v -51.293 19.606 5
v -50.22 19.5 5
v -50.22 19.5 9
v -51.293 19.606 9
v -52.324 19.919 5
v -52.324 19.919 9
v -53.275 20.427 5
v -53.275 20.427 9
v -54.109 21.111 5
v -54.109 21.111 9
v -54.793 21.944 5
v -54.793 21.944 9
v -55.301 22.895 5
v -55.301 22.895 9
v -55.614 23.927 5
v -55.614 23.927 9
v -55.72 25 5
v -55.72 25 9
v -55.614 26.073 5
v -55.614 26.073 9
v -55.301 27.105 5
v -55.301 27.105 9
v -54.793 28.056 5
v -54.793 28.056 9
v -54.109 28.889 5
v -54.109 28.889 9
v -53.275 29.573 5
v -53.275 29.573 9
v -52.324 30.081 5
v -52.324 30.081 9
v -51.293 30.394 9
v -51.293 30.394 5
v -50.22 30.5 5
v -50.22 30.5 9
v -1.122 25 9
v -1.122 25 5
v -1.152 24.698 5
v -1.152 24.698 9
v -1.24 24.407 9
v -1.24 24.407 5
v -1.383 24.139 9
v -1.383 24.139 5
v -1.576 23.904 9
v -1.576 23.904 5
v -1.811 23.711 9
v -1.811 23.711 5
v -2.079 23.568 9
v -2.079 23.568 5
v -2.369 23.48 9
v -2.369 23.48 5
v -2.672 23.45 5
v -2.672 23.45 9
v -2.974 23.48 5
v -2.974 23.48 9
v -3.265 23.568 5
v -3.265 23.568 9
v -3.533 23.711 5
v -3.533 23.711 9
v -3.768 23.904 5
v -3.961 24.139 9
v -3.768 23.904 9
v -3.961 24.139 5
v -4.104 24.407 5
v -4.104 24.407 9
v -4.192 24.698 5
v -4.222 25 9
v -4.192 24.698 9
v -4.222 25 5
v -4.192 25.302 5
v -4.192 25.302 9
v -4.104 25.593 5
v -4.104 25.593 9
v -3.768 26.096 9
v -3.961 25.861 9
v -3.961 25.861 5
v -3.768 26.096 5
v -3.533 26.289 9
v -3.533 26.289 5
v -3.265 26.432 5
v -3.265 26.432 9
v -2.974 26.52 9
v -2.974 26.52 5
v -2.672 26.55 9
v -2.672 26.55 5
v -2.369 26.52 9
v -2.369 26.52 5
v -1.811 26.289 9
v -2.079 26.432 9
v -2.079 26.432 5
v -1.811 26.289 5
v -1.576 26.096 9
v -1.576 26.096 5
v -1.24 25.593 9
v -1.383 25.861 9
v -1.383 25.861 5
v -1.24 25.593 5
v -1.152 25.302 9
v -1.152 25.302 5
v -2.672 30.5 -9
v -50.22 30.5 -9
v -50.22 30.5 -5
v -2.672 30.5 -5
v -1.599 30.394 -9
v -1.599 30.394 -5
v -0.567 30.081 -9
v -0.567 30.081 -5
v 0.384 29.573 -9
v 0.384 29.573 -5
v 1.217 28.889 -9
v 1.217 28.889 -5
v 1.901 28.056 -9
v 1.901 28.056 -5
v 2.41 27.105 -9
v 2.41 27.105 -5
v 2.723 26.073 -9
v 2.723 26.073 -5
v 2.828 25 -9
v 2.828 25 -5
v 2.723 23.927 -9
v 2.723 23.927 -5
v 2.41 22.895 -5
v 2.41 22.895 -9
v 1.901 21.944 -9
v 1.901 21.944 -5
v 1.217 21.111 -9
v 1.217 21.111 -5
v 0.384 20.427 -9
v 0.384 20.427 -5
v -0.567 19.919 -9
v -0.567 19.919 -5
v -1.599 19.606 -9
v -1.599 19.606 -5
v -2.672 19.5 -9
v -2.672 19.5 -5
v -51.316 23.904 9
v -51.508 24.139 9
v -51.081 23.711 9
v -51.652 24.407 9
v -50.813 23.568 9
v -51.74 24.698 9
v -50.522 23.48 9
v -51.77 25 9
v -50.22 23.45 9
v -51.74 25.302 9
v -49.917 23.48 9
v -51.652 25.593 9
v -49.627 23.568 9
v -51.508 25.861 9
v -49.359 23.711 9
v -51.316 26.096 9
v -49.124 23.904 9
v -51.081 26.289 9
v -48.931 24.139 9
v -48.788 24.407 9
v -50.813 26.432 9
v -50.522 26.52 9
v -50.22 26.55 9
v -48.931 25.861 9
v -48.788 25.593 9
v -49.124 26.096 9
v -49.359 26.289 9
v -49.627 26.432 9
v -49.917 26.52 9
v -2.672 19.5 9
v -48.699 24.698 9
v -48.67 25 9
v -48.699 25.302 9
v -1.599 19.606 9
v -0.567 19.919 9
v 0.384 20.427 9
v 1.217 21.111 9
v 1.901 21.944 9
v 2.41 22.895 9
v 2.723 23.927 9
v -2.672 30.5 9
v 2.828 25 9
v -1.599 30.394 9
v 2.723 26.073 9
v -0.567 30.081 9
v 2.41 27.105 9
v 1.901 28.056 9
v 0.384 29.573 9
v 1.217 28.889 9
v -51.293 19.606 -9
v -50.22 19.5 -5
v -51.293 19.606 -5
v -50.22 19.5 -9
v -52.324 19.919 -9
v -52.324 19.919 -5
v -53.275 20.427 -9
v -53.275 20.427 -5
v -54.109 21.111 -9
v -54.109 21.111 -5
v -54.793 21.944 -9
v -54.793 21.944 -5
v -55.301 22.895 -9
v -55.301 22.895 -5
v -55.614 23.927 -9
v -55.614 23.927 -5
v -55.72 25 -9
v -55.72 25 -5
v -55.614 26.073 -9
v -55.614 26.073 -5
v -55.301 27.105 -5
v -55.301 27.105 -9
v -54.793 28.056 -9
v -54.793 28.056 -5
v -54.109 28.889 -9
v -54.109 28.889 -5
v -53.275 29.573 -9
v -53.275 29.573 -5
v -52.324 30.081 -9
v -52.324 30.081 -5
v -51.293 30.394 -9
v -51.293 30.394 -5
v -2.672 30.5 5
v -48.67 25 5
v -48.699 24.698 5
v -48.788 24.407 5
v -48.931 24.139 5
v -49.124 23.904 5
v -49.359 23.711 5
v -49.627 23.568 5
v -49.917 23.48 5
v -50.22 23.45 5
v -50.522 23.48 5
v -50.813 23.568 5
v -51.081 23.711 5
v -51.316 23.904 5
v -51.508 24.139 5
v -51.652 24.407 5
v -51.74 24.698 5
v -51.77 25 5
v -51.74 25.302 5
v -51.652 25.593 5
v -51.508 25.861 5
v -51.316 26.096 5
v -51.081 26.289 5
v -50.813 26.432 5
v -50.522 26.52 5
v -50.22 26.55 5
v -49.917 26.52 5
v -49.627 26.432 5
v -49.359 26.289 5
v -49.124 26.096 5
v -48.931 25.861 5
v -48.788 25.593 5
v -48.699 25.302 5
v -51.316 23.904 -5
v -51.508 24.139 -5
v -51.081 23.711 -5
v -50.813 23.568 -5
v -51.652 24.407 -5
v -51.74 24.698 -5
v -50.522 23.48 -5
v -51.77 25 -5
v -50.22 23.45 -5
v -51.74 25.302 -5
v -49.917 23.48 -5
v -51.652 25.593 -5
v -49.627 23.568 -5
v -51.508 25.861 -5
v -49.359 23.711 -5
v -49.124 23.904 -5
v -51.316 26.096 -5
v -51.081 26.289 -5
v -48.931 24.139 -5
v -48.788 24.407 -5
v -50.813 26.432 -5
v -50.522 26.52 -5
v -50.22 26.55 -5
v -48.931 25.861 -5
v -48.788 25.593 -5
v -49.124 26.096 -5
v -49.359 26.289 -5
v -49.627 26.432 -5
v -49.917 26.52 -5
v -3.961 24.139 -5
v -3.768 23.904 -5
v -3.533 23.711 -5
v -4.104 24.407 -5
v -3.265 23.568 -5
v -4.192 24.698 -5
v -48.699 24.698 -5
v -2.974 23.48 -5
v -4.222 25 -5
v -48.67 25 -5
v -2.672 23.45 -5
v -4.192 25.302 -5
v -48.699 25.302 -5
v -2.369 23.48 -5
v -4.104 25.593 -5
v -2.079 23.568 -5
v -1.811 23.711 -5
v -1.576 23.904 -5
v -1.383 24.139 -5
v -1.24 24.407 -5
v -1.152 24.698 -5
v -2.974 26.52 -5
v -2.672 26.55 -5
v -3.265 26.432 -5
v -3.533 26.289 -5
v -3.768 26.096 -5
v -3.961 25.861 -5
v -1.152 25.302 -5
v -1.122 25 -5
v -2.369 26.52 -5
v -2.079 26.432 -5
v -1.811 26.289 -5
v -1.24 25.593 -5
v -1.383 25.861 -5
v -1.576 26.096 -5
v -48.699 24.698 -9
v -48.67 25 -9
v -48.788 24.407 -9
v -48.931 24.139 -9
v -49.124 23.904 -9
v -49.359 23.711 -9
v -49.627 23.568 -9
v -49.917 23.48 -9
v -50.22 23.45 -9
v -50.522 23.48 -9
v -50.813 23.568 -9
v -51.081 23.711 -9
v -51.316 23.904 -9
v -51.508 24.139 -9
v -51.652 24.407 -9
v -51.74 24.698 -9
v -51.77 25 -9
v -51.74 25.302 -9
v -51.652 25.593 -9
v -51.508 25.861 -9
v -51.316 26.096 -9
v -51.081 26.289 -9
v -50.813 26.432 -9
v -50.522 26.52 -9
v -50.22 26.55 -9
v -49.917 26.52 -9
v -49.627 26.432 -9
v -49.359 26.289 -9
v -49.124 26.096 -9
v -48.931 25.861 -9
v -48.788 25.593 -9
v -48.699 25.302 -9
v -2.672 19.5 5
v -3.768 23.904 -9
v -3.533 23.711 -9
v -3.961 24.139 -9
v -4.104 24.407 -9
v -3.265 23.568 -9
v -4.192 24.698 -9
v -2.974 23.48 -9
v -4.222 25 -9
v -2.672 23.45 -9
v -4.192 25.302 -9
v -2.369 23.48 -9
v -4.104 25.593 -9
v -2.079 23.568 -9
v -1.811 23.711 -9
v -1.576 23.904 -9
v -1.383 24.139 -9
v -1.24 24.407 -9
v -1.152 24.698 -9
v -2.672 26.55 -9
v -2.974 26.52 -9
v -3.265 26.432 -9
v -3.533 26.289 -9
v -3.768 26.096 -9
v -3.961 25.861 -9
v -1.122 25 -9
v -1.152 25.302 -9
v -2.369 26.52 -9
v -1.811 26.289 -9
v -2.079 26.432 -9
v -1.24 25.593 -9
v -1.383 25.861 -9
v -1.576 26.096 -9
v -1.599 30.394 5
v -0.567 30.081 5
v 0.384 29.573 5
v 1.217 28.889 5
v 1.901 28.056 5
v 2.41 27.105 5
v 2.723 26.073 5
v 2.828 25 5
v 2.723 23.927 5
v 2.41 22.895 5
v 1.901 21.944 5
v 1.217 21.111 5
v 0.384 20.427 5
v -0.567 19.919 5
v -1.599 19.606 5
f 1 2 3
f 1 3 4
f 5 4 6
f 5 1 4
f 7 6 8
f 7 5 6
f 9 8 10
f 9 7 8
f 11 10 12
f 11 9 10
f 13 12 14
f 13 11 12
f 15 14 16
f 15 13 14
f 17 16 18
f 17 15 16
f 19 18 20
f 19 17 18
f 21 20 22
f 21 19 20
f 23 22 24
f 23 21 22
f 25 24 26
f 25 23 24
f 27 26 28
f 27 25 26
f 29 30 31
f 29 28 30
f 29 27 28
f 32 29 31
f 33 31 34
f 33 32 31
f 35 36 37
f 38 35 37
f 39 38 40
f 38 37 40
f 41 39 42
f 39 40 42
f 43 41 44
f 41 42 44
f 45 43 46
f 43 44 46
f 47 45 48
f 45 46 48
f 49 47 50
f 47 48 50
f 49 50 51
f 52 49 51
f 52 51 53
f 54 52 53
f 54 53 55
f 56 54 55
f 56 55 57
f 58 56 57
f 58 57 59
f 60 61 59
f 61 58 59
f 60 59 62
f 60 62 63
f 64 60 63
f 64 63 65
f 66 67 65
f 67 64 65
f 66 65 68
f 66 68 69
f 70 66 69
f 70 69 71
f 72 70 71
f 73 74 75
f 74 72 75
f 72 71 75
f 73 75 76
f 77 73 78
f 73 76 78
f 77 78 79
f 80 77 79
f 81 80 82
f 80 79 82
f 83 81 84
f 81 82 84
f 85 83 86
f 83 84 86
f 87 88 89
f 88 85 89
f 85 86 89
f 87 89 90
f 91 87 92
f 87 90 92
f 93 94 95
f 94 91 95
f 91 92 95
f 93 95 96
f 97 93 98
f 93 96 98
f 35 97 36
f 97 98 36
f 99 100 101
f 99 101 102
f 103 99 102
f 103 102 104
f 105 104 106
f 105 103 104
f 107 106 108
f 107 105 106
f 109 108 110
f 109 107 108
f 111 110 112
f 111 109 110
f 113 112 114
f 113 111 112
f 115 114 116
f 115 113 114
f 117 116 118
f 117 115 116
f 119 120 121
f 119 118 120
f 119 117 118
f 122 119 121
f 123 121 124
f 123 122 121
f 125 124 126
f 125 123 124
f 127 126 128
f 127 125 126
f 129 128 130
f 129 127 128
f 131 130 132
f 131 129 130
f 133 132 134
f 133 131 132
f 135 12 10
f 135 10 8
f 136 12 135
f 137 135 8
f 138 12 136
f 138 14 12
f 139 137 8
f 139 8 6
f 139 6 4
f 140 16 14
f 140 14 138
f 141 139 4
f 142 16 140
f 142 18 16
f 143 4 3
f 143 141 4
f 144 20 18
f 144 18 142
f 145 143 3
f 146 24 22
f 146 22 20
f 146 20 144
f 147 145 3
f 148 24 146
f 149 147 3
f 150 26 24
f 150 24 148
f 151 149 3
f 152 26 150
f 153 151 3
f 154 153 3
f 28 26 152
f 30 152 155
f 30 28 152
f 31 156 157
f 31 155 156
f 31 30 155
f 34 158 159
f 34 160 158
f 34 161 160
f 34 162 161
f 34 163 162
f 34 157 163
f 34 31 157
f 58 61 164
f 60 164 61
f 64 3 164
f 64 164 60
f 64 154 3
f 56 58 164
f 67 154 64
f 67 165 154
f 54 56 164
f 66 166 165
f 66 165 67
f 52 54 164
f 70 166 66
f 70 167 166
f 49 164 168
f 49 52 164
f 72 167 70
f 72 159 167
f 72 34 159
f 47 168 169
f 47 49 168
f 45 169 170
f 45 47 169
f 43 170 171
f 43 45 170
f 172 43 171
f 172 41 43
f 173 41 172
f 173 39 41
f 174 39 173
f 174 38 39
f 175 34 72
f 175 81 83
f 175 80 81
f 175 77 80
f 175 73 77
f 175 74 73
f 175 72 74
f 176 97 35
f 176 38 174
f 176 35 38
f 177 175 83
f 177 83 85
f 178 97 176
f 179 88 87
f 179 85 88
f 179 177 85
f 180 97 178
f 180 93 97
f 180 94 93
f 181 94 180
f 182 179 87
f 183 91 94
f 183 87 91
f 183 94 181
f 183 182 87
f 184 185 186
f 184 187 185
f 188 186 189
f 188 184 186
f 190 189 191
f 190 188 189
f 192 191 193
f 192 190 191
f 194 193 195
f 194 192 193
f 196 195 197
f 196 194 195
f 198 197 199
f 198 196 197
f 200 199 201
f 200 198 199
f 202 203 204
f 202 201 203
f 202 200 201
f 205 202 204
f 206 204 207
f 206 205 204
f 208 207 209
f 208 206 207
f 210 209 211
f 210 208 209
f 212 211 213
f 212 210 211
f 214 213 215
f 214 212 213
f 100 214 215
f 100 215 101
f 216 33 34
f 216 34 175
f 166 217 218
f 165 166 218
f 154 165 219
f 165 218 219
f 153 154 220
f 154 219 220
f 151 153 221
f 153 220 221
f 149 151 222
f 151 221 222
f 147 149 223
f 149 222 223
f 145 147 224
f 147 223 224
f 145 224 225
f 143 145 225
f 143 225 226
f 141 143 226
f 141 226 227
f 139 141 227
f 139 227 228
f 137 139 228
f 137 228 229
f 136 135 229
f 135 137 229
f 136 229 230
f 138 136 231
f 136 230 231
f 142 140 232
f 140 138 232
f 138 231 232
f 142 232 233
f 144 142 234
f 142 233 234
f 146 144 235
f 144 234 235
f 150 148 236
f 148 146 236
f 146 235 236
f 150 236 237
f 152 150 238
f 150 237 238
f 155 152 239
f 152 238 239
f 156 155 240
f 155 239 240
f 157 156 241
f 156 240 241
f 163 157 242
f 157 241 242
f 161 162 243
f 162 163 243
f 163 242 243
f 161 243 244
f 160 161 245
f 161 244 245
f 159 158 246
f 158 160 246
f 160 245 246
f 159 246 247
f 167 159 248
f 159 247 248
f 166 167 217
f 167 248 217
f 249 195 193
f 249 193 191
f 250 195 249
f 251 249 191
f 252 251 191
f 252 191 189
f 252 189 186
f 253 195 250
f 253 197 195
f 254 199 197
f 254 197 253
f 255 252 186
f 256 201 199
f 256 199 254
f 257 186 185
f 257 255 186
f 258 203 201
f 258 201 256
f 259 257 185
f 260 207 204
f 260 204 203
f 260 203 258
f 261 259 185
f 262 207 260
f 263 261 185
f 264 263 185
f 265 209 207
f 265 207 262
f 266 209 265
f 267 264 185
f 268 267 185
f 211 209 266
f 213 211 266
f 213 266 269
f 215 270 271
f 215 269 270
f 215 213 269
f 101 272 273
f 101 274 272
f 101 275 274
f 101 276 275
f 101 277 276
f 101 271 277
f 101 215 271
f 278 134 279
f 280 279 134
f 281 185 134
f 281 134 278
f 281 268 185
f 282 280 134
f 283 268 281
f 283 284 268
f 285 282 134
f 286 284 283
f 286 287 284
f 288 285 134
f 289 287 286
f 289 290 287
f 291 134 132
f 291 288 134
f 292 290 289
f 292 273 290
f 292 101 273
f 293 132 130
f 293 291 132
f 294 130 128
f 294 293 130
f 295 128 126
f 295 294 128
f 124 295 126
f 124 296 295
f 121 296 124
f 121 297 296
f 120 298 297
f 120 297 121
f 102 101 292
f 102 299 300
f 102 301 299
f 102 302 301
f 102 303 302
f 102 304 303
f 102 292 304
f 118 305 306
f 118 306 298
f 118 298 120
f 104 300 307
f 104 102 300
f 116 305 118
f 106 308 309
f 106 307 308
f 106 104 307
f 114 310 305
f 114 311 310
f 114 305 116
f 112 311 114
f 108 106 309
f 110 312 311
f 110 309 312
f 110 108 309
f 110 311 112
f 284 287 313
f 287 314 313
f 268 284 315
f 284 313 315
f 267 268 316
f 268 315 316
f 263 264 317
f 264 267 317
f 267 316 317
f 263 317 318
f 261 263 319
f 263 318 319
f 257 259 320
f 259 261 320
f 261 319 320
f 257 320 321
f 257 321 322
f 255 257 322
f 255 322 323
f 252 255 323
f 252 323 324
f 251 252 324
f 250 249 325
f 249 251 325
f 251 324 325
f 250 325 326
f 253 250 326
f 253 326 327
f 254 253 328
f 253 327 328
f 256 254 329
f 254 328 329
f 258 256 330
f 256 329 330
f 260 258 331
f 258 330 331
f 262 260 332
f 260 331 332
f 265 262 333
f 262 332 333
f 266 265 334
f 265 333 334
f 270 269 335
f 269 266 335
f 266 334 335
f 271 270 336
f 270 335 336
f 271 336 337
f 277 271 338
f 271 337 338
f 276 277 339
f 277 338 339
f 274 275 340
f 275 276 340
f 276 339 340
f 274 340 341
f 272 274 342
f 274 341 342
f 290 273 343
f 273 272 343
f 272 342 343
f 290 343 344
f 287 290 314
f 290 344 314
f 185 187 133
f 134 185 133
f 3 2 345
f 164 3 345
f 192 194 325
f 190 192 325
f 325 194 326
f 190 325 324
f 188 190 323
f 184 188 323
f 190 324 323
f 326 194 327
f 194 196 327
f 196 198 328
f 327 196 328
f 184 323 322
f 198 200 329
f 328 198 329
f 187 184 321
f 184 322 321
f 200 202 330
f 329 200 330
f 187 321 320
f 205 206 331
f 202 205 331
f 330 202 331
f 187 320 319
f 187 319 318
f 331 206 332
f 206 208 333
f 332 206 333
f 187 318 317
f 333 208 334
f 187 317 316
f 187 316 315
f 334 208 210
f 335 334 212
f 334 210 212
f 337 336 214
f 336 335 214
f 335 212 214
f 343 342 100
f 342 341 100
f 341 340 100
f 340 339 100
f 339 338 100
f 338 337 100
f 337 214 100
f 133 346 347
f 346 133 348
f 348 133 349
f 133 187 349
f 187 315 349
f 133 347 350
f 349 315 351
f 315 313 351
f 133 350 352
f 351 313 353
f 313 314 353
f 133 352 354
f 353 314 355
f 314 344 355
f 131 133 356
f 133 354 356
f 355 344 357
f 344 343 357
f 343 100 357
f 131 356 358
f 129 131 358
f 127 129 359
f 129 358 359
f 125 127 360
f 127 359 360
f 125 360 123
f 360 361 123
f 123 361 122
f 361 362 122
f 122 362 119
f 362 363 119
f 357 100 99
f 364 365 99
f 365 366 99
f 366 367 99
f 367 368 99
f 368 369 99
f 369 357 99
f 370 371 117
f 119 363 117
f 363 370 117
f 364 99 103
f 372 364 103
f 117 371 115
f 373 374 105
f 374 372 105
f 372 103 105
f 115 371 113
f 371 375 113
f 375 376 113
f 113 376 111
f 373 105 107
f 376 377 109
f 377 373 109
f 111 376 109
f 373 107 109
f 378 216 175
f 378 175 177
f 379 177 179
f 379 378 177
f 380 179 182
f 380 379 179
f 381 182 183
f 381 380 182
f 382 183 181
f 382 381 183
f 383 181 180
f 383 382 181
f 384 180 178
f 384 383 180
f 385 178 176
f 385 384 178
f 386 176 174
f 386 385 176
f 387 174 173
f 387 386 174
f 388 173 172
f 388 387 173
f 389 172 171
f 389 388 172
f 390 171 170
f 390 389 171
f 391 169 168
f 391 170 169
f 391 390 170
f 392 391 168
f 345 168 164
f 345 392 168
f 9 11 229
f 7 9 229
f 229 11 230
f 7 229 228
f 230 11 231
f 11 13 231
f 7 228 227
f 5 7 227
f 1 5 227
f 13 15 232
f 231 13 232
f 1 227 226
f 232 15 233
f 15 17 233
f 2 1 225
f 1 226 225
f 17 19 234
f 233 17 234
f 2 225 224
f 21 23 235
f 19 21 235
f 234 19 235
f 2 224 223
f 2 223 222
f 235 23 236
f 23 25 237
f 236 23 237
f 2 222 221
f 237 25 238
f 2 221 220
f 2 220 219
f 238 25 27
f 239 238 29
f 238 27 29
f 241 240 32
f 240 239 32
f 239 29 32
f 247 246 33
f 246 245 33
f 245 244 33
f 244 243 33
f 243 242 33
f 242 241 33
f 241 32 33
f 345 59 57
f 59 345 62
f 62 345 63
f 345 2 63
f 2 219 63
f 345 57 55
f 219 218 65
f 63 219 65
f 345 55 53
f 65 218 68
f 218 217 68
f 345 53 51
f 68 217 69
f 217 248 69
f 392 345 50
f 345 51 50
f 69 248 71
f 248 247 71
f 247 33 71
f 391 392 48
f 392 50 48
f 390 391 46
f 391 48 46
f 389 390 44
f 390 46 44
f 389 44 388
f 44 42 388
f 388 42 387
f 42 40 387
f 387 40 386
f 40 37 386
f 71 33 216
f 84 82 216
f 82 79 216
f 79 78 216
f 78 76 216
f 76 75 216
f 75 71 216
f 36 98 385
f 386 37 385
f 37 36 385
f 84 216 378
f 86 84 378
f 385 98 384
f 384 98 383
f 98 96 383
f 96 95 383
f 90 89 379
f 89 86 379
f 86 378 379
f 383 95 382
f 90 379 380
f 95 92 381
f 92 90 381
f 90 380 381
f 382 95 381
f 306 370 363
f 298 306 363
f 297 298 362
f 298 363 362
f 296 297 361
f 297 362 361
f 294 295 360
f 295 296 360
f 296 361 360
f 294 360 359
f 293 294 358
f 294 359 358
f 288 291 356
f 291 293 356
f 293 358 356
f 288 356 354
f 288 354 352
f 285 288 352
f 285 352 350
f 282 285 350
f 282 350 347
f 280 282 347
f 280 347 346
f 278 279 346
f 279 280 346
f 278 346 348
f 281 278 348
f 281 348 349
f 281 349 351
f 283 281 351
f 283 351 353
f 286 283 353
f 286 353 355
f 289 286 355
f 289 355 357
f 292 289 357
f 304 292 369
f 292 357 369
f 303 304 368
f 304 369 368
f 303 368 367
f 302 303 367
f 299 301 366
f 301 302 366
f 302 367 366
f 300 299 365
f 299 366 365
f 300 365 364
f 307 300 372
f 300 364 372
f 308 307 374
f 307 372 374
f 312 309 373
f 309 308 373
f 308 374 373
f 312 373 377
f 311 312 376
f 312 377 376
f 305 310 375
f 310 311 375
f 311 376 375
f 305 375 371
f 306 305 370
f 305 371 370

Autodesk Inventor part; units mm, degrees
ref_plane "YZ Plane" through (0, 0, 0) normal (1, 0, 0) x (0, 1, 0)
ref_plane "XZ Plane" through (0, 0, 0) normal (0, 1, 0) x (-1, 0, 0)
ref_plane "XY Plane" through (0, 0, 0) normal (0, 0, 1) x (1, 0, 0)
sketch "Sketch1" plane through (0, 0, 0) normal (0, 0, 1) x (1, 0, 0)
  line L0 (-50.2197, 25) -> (-2.6718, 25) construction
  circle A0 centre (-50.2197, 25) radius 1.55
  arc A1 (-50.2197, 19.5) -> (-50.2197, 30.5) centre (-50.2197, 25) ccw construction
  circle A2 centre (-2.6718, 25) radius 1.55
  arc A3 (-2.6718, 30.5) -> (-2.6718, 19.5) centre (-2.6718, 25) ccw construction
  line L1 (-50.2197, 30.5) -> (-2.6718, 30.5)
  line L2 (-50.2197, 19.5) -> (-2.6718, 19.5)
  arc A4 (-50.2197, 30.5) -> (-50.2197, 19.5) centre (-50.2197, 25) ccw
  arc A5 (-2.6718, 19.5) -> (-2.6718, 30.5) centre (-2.6718, 25) ccw
  point P0 (0, 0)
  dimension "d0" = 11
  dimension "d1" = 3.1
extrude "Extrusion1" add sketch "Sketch1" along normal mid plane 18
sketch "Sketch2" plane through (0, 0, 0) normal (0, 0, 1) x (1, 0, 0)
  circle A0 centre (-2.6718, 25) radius 1.55 projected
  circle A1 centre (-50.2197, 25) radius 1.55 projected
  line L0 (-2.6718, 30.5) -> (-50.2197, 30.5) projected
  arc A2 (-50.2197, 30.5) -> (-50.2197, 19.5) centre (-50.2197, 25) ccw projected
  line L1 (-50.2197, 19.5) -> (-2.6718, 19.5) projected
  arc A3 (-2.6718, 19.5) -> (-2.6718, 30.5) centre (-2.6718, 25) ccw projected
  point P0 (0, 0)
extrude "Extrusion2" cut sketch "Sketch2" along normal mid plane 10
properties part number "biela-dedo-2"
